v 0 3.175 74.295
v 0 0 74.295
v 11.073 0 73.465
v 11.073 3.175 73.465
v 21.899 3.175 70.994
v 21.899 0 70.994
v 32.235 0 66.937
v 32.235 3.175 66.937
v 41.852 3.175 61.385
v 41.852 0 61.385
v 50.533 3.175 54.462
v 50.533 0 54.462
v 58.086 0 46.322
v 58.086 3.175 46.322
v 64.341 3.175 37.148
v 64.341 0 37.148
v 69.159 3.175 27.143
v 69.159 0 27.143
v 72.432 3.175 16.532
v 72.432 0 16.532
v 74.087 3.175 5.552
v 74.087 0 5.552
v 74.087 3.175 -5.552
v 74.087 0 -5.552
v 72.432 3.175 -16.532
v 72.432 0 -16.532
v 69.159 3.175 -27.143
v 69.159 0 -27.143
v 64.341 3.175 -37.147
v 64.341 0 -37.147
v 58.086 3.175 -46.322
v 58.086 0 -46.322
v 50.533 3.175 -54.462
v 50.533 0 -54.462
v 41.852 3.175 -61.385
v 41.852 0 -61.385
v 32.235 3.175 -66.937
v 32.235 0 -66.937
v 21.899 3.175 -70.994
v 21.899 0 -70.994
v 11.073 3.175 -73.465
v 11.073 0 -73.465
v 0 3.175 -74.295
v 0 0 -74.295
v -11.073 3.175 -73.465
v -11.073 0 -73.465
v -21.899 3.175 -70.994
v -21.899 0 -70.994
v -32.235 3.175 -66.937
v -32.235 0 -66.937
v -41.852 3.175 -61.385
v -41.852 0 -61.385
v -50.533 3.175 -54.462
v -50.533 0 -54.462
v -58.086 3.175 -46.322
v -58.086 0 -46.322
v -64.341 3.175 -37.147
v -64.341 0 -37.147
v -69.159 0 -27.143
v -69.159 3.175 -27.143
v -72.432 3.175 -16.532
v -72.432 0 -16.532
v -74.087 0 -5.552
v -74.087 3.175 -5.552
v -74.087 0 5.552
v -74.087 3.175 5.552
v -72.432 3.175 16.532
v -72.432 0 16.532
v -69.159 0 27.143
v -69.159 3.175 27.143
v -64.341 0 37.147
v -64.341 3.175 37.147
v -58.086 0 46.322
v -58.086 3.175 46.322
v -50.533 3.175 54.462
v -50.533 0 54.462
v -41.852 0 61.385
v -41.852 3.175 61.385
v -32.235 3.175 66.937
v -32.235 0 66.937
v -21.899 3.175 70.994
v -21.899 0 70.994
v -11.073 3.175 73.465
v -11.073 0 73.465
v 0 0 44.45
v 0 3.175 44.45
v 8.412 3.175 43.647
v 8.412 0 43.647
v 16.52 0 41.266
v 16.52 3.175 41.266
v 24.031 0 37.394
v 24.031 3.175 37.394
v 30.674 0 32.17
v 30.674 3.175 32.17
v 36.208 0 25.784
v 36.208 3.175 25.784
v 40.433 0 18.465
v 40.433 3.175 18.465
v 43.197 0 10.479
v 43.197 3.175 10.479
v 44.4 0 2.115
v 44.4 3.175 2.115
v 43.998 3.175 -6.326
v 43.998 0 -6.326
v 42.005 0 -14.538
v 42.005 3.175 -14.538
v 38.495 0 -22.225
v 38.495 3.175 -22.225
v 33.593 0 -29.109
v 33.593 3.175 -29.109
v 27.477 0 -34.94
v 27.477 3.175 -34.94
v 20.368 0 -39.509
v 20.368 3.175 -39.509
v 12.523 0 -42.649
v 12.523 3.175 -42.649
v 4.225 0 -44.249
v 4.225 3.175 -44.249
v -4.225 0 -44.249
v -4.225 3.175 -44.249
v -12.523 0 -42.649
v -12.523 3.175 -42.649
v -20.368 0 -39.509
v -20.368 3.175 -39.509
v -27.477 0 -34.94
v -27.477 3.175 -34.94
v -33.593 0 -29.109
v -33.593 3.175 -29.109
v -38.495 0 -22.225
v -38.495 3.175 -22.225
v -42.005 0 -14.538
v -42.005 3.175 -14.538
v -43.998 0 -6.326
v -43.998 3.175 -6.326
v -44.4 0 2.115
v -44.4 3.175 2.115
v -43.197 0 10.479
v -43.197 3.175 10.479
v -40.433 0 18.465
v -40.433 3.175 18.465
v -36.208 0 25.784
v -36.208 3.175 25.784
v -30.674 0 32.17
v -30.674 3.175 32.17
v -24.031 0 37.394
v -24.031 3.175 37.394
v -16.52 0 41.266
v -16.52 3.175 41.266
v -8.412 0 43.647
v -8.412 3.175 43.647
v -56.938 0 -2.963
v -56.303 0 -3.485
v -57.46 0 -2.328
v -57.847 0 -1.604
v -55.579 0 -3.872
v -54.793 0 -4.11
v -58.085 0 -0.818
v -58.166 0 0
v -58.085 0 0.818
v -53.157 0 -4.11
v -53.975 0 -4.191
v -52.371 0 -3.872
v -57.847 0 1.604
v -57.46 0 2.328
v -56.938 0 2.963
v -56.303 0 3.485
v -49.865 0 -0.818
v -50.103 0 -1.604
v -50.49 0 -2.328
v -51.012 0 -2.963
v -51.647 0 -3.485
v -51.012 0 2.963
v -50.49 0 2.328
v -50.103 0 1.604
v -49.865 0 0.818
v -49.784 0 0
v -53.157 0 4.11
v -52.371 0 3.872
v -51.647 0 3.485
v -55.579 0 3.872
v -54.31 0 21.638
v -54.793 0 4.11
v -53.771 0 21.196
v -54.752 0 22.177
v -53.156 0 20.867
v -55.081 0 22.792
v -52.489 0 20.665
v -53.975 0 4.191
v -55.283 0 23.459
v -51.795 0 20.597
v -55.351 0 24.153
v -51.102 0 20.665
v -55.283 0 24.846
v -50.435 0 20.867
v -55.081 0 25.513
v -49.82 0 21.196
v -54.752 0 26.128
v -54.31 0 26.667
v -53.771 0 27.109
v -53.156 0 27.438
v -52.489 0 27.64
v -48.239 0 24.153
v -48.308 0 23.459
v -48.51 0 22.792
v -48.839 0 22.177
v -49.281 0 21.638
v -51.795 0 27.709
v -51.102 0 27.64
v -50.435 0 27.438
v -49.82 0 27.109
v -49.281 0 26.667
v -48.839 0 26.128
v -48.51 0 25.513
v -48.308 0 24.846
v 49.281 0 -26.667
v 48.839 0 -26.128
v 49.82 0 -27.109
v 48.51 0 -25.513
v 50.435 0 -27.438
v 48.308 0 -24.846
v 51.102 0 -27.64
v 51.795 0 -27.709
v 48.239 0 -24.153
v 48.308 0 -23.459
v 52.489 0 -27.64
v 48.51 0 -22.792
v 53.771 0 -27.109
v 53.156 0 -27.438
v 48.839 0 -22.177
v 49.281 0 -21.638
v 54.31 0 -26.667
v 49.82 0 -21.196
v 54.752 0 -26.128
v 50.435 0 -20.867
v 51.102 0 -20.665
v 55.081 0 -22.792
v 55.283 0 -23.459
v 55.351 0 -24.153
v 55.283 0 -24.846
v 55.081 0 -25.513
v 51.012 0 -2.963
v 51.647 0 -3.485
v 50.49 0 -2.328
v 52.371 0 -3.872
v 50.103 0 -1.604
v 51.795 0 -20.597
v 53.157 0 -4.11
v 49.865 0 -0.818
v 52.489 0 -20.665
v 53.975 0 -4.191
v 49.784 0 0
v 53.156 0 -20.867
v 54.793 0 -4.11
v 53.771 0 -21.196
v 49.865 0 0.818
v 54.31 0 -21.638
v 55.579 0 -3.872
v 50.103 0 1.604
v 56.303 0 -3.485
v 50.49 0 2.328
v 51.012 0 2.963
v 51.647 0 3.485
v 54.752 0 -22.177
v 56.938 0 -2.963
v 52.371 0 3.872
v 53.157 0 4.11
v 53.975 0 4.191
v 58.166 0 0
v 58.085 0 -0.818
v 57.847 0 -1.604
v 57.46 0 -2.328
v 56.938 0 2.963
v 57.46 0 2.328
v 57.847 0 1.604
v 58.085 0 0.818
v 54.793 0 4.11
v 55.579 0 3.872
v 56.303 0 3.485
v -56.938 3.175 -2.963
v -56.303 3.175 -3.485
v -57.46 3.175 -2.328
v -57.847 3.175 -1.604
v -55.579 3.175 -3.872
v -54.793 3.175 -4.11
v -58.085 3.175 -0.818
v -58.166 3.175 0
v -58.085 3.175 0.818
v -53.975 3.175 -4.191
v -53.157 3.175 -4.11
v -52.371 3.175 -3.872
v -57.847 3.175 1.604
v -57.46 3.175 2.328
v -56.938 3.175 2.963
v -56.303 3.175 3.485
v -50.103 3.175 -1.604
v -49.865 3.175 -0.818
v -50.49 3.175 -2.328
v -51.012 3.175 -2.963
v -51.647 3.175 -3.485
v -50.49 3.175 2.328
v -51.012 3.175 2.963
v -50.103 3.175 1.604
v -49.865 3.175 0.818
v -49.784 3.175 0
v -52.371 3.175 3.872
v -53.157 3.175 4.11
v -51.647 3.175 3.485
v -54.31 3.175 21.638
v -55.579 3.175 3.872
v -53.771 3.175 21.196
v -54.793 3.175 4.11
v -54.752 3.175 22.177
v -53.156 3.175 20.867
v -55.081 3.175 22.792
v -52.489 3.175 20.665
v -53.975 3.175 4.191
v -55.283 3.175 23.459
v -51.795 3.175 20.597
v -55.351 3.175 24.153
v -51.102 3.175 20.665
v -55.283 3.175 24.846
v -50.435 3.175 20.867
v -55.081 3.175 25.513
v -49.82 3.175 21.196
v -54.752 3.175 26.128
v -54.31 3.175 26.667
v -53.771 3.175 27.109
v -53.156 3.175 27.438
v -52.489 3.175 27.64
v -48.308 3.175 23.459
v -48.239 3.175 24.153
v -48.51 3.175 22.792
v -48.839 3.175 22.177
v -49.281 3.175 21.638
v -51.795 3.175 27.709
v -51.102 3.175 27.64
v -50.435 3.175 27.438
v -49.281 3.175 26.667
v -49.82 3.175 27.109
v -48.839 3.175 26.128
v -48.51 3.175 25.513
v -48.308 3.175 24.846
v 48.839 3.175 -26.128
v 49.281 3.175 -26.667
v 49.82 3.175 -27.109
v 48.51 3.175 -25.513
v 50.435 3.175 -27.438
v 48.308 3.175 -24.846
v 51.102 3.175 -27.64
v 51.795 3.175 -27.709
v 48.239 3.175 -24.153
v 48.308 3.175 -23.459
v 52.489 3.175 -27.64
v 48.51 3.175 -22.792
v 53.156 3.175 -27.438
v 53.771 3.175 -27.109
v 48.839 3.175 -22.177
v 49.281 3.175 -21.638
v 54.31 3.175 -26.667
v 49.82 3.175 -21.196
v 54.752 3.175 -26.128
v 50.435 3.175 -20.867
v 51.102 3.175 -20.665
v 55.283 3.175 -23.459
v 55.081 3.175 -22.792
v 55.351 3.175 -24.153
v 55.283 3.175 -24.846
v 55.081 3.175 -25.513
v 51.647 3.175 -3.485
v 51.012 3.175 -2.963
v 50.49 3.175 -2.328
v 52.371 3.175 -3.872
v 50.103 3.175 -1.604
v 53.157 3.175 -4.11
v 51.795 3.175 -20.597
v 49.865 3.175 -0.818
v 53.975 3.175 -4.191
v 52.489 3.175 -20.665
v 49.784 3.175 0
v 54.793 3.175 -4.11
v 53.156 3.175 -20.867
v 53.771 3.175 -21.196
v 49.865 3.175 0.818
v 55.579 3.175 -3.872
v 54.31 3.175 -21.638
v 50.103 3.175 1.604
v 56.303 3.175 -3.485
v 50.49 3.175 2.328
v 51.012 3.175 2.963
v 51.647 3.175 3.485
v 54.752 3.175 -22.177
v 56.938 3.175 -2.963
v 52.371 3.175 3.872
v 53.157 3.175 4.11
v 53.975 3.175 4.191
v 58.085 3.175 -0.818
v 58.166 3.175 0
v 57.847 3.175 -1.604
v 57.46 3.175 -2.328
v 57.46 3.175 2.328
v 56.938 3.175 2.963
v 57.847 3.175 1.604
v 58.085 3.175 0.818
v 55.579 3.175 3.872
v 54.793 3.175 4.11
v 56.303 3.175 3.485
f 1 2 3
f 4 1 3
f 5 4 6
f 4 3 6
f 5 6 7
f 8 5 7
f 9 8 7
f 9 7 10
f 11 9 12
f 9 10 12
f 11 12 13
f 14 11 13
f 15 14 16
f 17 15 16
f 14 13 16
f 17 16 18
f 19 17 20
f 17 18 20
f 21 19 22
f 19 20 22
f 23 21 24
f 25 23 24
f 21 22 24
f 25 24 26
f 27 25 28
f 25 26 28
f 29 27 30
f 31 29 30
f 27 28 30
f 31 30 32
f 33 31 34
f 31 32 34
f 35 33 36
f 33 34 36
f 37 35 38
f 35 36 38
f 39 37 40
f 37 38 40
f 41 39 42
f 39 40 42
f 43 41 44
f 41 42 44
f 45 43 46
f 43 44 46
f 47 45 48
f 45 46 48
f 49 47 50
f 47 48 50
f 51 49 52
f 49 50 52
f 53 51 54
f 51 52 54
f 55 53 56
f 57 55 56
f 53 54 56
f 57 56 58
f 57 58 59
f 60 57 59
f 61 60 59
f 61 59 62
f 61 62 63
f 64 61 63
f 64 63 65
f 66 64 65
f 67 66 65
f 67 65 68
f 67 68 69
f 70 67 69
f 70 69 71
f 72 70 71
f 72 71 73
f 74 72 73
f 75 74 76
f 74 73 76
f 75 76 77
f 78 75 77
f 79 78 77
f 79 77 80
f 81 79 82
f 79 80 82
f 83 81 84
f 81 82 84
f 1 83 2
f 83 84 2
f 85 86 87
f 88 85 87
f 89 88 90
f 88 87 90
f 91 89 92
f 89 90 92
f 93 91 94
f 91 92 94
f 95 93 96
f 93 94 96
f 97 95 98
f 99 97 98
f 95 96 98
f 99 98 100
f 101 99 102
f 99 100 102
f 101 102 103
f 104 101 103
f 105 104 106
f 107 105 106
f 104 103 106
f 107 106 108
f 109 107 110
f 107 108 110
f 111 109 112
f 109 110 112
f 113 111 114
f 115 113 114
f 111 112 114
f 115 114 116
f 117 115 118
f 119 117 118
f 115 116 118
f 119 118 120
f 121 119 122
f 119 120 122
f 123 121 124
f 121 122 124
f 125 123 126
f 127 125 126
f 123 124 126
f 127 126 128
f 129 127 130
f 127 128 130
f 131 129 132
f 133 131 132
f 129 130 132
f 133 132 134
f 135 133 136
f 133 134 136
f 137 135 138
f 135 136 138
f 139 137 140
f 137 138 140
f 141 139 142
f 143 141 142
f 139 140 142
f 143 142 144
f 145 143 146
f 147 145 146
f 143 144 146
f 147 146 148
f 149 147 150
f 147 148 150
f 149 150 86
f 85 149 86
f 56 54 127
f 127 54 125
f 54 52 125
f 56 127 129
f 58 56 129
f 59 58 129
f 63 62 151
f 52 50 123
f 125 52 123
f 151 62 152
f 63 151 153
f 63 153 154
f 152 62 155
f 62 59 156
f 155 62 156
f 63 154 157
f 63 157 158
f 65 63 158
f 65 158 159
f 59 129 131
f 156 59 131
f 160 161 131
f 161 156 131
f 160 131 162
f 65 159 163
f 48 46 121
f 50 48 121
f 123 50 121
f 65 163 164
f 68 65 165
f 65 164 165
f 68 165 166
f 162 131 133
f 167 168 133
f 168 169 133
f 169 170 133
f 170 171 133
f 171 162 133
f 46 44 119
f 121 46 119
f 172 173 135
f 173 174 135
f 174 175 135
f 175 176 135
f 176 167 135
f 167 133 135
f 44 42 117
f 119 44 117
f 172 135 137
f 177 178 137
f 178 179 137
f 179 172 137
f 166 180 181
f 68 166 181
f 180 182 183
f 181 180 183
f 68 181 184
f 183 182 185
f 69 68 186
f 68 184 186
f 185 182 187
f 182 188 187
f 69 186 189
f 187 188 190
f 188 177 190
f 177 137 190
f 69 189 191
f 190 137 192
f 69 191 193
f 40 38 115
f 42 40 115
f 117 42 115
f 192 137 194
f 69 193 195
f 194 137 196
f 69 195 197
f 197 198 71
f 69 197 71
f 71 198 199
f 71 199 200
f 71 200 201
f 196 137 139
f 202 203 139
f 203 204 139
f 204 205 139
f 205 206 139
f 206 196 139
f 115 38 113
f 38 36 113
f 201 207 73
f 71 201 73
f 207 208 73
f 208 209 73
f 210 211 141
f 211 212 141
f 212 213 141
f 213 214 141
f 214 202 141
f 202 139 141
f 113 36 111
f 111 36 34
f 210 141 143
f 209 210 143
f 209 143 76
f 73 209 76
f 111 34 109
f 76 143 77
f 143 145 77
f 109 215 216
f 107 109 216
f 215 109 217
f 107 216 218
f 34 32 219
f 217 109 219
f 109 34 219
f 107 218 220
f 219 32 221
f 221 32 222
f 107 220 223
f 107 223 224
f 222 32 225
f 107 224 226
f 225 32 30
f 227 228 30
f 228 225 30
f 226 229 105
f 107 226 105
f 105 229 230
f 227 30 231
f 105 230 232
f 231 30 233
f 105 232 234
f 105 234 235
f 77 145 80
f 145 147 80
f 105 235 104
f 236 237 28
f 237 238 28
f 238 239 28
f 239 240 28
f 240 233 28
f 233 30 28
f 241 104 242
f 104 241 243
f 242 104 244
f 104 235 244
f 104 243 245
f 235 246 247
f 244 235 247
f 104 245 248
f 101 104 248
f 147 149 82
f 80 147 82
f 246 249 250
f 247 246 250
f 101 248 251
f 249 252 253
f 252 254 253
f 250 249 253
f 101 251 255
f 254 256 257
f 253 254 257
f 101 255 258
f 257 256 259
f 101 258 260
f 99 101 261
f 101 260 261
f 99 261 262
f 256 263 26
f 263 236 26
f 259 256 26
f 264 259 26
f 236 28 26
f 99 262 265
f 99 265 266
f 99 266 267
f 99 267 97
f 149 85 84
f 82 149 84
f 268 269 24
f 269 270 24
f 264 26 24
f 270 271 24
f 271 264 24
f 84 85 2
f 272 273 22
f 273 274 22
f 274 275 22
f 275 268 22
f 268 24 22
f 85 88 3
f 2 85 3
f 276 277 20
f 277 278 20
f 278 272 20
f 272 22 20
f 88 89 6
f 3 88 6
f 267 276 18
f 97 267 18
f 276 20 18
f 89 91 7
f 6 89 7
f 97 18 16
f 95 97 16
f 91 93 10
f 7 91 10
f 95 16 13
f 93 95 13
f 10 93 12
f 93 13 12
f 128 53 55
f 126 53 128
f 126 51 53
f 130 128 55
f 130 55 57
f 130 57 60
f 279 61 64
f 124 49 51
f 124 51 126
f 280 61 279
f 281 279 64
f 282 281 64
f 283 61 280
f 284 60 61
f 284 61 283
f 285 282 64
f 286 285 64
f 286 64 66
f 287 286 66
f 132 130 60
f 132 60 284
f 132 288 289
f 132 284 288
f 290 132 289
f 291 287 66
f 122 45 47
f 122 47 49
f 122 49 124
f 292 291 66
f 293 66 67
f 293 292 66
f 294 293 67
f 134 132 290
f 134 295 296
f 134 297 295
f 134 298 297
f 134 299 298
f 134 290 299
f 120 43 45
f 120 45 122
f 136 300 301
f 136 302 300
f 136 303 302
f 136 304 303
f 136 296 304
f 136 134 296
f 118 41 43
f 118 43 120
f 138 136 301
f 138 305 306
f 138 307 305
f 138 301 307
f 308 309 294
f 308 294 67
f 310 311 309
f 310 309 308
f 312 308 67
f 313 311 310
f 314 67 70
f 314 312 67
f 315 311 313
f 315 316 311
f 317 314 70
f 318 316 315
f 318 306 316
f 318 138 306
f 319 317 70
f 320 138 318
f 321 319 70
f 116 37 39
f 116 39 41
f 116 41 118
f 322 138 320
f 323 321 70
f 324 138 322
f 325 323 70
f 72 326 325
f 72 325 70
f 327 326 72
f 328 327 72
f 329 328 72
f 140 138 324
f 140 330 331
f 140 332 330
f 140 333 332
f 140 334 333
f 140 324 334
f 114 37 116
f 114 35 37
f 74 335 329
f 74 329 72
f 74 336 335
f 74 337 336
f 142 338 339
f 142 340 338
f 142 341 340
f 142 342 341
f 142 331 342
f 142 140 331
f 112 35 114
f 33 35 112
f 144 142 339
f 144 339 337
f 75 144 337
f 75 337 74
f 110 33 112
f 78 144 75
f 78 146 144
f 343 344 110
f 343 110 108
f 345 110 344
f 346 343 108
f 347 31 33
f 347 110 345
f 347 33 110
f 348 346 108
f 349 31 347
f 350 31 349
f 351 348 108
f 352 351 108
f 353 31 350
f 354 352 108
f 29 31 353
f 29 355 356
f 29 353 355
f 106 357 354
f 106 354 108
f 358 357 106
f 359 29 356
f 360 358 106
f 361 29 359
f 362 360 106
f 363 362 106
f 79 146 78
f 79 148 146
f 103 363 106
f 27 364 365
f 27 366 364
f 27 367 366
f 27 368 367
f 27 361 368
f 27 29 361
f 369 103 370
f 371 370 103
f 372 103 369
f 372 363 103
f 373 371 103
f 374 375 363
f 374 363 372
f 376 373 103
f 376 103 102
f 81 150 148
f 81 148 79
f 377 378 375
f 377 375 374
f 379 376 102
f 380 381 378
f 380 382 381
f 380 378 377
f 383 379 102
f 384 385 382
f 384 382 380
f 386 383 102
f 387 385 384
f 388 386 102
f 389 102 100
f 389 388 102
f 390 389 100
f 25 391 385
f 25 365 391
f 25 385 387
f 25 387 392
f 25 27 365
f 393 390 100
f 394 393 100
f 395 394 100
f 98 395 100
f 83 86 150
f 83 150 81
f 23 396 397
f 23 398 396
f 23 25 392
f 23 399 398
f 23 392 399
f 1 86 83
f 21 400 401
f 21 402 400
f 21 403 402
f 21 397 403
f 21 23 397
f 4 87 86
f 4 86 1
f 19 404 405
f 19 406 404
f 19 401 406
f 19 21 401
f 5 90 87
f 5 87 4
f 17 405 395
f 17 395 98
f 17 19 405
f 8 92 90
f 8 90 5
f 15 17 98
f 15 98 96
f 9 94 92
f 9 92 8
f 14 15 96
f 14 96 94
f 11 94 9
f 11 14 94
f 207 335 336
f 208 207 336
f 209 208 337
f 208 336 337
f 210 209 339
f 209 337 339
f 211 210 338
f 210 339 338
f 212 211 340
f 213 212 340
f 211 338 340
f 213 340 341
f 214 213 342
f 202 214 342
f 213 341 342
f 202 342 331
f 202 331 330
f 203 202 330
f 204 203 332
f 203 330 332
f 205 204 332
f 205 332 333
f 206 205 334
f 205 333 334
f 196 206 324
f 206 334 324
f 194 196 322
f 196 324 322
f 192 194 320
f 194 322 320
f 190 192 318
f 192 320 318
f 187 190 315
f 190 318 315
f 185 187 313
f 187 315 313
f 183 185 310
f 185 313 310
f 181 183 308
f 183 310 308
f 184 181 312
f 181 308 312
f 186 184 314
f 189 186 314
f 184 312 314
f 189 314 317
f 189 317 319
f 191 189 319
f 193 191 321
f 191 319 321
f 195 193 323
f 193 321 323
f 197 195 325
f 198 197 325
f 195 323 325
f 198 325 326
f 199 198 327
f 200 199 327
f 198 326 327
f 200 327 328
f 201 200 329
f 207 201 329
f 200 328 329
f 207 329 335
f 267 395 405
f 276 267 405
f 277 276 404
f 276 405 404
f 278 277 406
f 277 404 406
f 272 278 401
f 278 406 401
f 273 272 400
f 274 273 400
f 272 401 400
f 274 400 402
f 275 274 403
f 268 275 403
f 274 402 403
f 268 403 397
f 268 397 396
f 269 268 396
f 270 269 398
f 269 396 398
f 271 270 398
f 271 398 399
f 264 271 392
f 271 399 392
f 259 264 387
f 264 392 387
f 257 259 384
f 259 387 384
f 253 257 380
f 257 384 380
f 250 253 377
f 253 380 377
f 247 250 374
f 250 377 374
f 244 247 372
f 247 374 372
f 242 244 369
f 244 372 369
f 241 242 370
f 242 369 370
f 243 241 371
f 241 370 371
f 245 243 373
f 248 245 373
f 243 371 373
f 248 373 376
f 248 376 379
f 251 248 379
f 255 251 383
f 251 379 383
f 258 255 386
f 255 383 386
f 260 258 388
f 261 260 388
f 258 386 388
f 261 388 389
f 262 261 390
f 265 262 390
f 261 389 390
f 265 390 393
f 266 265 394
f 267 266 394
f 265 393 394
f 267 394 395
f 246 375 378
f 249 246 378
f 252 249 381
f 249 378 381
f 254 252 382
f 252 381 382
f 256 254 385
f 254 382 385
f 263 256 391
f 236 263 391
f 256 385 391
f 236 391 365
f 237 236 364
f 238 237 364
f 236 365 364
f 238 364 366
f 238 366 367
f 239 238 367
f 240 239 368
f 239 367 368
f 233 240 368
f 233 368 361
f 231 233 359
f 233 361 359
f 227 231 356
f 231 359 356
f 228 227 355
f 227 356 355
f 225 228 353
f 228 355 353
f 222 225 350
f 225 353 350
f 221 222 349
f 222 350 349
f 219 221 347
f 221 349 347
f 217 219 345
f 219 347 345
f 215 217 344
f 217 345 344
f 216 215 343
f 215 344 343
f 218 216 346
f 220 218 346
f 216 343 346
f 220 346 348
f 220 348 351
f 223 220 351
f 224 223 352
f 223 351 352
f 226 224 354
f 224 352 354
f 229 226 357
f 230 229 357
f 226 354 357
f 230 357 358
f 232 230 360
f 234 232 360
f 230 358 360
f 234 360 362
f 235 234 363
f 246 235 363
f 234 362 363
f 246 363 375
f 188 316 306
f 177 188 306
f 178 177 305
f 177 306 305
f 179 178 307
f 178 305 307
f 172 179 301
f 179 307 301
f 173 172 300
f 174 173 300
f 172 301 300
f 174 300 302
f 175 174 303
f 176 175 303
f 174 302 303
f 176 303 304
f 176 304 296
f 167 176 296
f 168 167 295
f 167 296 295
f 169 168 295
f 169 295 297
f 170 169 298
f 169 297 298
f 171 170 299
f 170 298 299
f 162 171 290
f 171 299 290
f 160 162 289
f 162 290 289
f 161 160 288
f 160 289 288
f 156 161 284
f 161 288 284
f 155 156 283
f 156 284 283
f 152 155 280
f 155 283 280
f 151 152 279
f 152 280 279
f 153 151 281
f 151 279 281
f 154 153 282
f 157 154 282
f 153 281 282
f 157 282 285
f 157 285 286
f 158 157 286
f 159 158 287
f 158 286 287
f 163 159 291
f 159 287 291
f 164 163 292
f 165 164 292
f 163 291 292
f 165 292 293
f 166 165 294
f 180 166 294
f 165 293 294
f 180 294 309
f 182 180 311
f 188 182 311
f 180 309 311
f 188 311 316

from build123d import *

# Parameters (mm, degrees)
SKETCH1_R           = 74.295
BOSS_EXTRUDE1_DEPTH = 3.175
SKETCH2_R           = 3.556
SKETCH2_R_2         = 4.191
CUT_EXTRUDE1_DEPTH  = 3.175
SKETCH3_R           = 44.45
CUT_EXTRUDE2_DEPTH  = 3.175


with BuildPart() as part:
    # Sketch1 → Boss-Extrude1 (new body)
    with BuildSketch(Plane(origin=(0, 0, 0), x_dir=(1, 0, 0), z_dir=(0, 1, 0))):
        with Locations(Location((0, 0, 0), (0, 0, 270))):
            Circle(SKETCH1_R)
    extrude(amount=BOSS_EXTRUDE1_DEPTH)

    # Sketch2 → Cut-Extrude1 (cut)
    with BuildSketch(Plane(origin=(0, 3.175, 0), x_dir=(1, 0, 0), z_dir=(0, 1, 0))):
        with Locations(Location((-51.795490029, -24.152633658, 0), (0, 0, 270))):
            Circle(SKETCH2_R)
        with Locations(Location((51.795490029, 24.152633658, 0), (0, 0, 270))):
            Circle(SKETCH2_R)
        with Locations(Location((-53.975, 0, 0), (0, 0, 270))):
            Circle(SKETCH2_R_2)
        with Locations(Location((53.975, 0, 0), (0, 0, 270))):
            Circle(SKETCH2_R_2)
    extrude(amount=-CUT_EXTRUDE1_DEPTH, mode=Mode.SUBTRACT)

    # Sketch3 → Cut-Extrude2 (cut)
    with BuildSketch(Plane(origin=(0, 3.175, 0), x_dir=(1, 0, 0), z_dir=(0, 1, 0))):
        with Locations(Location((0, 0, 0), (0, 0, 270))):
            Circle(SKETCH3_R)
    extrude(amount=-CUT_EXTRUDE2_DEPTH, mode=Mode.SUBTRACT)


solid = part.part
